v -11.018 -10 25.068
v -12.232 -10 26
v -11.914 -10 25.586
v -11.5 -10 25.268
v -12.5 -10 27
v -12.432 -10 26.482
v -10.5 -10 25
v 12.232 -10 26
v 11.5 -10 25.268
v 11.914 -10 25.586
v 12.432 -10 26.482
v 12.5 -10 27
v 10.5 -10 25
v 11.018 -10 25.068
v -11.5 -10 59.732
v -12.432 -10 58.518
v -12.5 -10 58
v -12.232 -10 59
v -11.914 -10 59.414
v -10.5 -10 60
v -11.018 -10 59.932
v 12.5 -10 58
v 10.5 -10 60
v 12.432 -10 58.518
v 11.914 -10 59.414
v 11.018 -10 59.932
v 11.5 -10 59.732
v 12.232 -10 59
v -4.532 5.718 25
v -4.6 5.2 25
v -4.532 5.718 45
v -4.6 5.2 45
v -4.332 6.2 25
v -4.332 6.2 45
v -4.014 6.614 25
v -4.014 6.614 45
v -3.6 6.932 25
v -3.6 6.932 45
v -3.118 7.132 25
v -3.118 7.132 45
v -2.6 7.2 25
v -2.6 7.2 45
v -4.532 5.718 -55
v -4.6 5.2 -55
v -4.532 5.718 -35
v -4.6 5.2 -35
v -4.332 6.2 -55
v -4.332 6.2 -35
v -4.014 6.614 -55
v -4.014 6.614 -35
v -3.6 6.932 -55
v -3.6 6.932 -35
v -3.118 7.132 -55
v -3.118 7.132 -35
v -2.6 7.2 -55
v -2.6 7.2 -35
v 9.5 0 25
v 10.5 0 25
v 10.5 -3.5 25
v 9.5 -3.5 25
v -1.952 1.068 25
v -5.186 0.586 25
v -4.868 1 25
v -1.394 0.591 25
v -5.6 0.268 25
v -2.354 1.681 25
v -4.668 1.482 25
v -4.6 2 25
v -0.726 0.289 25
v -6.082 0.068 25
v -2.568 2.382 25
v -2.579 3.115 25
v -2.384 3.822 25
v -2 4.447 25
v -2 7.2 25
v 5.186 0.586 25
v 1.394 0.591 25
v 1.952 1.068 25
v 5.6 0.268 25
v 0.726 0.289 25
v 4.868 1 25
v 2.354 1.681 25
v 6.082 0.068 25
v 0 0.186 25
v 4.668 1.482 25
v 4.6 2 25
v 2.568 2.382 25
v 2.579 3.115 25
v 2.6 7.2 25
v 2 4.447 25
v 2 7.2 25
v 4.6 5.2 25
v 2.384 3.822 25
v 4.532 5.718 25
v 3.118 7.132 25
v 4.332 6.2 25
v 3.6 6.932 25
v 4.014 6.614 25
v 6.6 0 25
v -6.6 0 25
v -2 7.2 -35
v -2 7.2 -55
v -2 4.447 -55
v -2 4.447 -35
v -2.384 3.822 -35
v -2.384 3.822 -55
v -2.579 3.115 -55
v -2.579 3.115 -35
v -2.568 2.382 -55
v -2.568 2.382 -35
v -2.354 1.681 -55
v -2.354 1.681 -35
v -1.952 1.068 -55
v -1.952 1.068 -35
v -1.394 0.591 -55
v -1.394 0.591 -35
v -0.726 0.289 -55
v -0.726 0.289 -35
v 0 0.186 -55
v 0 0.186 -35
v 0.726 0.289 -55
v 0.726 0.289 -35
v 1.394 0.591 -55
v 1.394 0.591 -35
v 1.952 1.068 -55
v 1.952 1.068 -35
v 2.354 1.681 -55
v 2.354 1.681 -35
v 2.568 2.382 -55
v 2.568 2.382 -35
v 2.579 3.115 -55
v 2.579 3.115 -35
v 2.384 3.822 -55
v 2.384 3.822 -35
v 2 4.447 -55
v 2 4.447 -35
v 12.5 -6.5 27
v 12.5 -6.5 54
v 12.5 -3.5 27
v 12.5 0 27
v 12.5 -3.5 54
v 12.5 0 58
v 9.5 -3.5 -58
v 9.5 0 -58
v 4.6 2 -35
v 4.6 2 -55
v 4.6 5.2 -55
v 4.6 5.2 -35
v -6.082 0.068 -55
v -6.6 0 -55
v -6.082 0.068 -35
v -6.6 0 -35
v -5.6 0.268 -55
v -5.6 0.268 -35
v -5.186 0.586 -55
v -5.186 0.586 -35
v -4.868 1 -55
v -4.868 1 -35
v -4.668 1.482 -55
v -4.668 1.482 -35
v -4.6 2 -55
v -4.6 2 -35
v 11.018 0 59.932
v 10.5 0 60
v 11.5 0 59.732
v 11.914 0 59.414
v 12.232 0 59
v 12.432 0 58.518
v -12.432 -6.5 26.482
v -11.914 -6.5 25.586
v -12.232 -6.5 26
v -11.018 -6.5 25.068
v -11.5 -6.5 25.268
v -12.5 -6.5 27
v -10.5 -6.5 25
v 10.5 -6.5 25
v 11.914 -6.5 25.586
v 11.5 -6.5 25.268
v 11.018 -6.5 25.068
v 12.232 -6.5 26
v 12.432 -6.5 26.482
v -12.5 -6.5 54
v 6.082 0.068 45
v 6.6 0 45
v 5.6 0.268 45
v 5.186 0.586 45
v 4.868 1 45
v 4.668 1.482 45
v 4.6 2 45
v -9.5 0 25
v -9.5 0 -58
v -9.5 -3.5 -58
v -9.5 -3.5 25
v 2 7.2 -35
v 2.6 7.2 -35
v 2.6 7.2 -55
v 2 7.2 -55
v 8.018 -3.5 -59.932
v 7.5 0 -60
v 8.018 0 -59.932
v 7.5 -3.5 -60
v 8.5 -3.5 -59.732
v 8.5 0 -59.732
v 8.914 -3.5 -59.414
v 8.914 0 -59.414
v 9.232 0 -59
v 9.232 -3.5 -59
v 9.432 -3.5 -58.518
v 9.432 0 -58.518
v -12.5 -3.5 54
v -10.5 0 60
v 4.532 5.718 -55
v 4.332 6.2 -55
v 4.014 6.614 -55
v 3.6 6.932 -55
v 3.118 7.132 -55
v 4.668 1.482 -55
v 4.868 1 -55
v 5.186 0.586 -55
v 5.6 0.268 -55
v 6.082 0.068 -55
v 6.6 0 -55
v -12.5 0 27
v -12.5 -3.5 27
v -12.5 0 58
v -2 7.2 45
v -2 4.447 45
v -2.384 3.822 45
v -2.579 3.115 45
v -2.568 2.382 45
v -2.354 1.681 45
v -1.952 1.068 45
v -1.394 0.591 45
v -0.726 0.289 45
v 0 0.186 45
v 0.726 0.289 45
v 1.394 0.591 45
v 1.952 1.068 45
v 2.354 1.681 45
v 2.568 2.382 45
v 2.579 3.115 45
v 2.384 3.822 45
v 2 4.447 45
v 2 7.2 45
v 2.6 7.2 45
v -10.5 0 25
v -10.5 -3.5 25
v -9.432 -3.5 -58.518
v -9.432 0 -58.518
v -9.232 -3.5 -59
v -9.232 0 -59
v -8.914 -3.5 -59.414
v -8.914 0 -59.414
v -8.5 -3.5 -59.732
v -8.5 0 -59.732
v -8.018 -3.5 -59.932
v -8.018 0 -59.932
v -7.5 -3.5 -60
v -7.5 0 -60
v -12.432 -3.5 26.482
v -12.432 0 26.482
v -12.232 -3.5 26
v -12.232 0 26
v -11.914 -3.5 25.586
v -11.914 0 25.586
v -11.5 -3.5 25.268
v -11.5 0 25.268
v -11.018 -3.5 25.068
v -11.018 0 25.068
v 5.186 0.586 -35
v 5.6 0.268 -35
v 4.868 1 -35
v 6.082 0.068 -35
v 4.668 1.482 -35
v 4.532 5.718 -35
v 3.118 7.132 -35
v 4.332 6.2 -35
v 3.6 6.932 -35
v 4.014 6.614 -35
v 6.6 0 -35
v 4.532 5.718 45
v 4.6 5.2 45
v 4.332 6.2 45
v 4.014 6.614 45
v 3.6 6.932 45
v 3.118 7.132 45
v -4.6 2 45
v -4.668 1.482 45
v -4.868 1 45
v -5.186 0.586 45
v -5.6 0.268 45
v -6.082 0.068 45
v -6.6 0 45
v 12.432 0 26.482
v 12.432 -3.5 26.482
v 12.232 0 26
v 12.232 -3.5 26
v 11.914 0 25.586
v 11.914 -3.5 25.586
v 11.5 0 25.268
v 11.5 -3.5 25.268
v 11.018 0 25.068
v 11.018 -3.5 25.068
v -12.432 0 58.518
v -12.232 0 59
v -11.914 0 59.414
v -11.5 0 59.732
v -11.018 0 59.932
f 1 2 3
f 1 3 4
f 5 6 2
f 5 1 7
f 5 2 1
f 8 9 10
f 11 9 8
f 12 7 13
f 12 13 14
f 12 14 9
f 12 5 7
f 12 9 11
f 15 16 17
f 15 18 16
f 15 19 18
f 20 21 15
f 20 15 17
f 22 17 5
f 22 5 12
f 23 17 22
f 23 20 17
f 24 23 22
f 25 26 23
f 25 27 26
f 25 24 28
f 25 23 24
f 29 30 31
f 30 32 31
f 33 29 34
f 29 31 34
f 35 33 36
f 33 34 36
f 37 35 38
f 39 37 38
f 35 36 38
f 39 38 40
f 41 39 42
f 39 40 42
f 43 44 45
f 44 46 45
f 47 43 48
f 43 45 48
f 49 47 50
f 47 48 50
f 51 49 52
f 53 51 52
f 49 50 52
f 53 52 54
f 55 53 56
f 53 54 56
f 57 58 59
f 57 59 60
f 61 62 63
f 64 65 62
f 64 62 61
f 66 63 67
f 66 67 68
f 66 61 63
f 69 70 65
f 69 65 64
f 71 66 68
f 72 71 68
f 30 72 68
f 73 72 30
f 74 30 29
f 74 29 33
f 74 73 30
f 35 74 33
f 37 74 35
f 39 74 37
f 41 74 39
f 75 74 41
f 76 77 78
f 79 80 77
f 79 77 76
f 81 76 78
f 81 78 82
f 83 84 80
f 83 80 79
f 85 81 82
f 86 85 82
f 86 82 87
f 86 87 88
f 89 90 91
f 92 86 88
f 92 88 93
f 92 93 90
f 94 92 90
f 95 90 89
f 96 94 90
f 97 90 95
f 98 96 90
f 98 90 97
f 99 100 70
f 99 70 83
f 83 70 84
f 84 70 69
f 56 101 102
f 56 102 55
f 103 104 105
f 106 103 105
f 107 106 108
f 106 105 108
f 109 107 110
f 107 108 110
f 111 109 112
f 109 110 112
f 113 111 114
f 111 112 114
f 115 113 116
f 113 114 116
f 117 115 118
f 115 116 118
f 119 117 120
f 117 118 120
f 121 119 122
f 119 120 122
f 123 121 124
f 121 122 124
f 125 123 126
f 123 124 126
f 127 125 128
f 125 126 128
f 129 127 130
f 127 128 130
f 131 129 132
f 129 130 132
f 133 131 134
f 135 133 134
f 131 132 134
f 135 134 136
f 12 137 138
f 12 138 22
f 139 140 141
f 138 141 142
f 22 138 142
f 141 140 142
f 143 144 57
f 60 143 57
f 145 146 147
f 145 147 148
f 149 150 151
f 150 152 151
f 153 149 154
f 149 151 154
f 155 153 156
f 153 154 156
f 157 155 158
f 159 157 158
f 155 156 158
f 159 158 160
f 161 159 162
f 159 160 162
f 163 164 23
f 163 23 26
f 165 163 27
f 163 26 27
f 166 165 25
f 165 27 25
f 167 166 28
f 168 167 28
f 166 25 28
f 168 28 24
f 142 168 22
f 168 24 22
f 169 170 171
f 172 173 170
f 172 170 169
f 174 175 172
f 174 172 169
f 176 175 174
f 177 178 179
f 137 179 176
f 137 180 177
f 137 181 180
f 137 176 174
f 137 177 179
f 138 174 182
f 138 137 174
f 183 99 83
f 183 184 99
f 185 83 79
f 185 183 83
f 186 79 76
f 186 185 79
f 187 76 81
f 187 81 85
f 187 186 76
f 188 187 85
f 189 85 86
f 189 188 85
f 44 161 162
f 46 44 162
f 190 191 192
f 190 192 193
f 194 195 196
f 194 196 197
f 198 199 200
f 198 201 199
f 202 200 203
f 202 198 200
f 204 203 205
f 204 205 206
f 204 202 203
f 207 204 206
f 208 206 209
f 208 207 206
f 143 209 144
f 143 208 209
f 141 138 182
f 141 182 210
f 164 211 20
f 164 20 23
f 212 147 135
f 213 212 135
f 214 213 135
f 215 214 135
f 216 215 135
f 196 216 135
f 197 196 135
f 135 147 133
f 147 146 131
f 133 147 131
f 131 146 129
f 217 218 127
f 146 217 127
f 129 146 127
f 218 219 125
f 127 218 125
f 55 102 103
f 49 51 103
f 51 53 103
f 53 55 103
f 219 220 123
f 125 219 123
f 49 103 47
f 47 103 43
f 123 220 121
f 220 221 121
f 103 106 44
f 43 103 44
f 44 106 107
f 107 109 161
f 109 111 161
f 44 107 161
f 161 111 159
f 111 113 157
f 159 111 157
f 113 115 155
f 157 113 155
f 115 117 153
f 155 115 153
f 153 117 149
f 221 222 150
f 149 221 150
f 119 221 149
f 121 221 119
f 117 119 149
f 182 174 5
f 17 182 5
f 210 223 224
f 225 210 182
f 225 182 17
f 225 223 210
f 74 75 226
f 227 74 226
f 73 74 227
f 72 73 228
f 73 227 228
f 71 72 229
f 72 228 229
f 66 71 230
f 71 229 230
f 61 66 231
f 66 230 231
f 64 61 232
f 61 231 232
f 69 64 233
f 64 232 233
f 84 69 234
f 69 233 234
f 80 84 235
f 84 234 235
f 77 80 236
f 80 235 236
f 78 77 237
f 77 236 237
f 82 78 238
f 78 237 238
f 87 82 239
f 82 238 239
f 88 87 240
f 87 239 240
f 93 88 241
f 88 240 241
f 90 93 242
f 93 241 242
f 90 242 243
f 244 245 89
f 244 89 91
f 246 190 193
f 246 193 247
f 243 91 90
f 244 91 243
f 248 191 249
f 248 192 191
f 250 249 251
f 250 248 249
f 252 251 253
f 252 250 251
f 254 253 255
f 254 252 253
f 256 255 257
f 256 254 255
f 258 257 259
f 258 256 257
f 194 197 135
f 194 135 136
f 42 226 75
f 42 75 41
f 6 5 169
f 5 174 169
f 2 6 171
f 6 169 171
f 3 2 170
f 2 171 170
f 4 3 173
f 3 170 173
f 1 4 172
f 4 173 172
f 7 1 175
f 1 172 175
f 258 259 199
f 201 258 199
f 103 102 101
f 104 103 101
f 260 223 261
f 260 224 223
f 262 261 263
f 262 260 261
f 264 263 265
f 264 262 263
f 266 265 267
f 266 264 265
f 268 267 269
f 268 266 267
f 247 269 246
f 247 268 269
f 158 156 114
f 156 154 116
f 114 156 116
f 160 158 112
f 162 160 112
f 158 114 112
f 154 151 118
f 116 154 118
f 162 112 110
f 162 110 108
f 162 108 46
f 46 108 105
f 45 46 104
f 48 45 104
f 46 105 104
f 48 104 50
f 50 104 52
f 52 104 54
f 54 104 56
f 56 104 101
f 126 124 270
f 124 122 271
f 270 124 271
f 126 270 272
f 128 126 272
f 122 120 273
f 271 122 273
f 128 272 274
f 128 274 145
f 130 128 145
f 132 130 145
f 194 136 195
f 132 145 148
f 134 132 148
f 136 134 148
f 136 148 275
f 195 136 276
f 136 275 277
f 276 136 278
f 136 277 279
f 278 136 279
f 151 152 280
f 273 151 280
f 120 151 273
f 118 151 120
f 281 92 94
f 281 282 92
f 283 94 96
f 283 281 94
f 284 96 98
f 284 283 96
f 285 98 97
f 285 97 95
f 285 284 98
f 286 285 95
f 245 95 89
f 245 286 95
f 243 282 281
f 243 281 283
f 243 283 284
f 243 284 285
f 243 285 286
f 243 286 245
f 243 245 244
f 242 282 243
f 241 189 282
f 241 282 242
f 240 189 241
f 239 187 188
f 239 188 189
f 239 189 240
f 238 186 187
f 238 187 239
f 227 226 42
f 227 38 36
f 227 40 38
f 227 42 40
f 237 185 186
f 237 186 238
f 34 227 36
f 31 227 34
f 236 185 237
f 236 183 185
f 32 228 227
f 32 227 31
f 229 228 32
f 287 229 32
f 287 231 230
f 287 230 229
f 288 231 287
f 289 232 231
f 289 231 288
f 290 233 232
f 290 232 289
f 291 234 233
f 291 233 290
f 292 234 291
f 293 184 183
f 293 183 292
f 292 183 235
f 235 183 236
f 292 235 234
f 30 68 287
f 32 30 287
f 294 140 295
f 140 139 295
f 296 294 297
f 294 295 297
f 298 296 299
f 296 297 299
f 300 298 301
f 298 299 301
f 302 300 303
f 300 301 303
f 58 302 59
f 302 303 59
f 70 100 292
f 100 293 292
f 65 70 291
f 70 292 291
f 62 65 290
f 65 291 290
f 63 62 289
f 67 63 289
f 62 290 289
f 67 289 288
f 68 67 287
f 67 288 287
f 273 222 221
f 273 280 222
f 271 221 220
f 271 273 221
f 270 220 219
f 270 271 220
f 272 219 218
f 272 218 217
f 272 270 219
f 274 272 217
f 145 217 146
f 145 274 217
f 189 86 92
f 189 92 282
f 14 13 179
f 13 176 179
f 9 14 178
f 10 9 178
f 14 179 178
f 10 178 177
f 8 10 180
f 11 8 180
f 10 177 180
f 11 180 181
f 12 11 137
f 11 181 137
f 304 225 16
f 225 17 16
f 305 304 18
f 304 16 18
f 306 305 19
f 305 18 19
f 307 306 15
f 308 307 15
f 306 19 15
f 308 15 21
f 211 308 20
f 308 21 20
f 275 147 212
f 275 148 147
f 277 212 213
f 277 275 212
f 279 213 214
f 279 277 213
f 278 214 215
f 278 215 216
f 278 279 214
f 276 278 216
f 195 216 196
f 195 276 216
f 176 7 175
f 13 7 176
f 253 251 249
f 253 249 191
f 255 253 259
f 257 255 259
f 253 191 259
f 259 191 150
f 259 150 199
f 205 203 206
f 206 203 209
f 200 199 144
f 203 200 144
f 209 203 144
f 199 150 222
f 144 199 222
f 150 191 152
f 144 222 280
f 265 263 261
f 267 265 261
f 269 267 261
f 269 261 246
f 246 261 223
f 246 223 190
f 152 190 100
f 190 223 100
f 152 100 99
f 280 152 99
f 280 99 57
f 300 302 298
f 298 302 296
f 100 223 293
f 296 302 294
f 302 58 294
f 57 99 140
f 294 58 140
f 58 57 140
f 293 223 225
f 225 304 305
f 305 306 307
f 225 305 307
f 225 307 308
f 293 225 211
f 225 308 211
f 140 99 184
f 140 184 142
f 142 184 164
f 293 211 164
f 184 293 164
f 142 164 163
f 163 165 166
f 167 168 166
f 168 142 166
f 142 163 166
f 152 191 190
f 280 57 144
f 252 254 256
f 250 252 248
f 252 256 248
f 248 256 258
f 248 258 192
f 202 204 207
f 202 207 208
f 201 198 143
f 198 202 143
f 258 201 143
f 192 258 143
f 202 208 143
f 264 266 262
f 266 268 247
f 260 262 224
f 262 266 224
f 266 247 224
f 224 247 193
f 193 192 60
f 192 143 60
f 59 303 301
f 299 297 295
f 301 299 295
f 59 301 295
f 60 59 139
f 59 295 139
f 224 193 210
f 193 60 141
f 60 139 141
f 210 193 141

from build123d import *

# Parameters (mm, degrees)
F0_W      = 25
F0_H      = 120
F1_DEPTH  = 10
F3_W      = 3
F3_H      = 114
F4_DEPTH  = 25.001
F5_W      = 9.2
F5_H      = 100
F6_DEPTH  = 7.2
F7_R      = 2.6
F8_DEPTH  = 105.001
F9_W      = 4
F9_H      = 100
F10_DEPTH = 3
F11_W     = 7.2
F11_H     = 60
F12_DEPTH = 17.101
F13_W     = 25
F13_H     = 85
F14_DEPTH = 3.5
F15_W     = 3
F15_H     = 85
F16_DEPTH = 3.5
F17_R     = 2


with BuildPart() as f1:
    # F0 (on Front) → F1 (new body)
    with BuildSketch(Plane.XZ):
        Rectangle(F0_W, F0_H)
    extrude(amount=F1_DEPTH)

    # F3 (on face) → F4 (cut, through all)
    with BuildSketch(Plane.YZ.offset(12.5)):
        with Locations((-5, -3)):
            Rectangle(F3_W, F3_H)
    extrude(amount=-F4_DEPTH, mode=Mode.SUBTRACT)

    # F5 (on face) → F6 (join)
    with BuildSketch(Plane(origin=(0, 0, 0), x_dir=(-1, 0, 0), z_dir=(0, 1, 0))):
        with Locations((0, -5)):
            Rectangle(F5_W, F5_H)
    extrude(amount=F6_DEPTH)

    # F7 (on face) → F8 (cut, through all)
    with BuildSketch(Plane.XY.offset(45)):
        with Locations((0, 2.785714576)):
            Circle(F7_R)
    extrude(amount=-F8_DEPTH, mode=Mode.SUBTRACT)

    # F9 (on face) → F10 (cut)
    with BuildSketch(Plane(origin=(0, 7.2, 0), x_dir=(-1, 0, 0), z_dir=(0, 1, 0))):
        with Locations((0, -5)):
            Rectangle(F9_W, F9_H)
    extrude(amount=-F10_DEPTH, mode=Mode.SUBTRACT)

    # F11 (on face) → F12 (cut, through all)
    with BuildSketch(Plane.YZ.offset(4.6)):
        with Locations((3.6, -5)):
            Rectangle(F11_W, F11_H)
    extrude(amount=-F12_DEPTH, mode=Mode.SUBTRACT)

    # F13 (on face) → F14 (cut, through all)
    with BuildSketch(Plane.XZ.offset(10)):
        with Locations((0, -17.5)):
            Rectangle(F13_W, F13_H)
    extrude(amount=-F14_DEPTH, mode=Mode.SUBTRACT)

    # F15 (on face) → F16 (cut, through all)
    with BuildSketch(Plane(origin=(0, 0, 0), x_dir=(-1, 0, 0), z_dir=(0, 1, 0))):
        with Locations((-11, -17.5)):
            Rectangle(F15_W, F15_H)
        with Locations((11, -17.5)):
            Rectangle(F15_W, F15_H)
    extrude(amount=-F16_DEPTH, mode=Mode.SUBTRACT)

    # F17
    f17_edges = [f1.edges().sort_by_distance(p)[0] for p in [
        (-12.5, -8.25, 25),
        (-12.5, -1.75, 25),
        (12.5, -1.75, 25),
        (12.5, -8.25, 25),
        (-12.5, -5, 60),
        (12.5, -5, 60),
        (-9.5, -1.75, -60),
        (9.5, -1.75, -60),
        (-4.6, 7.2, 35),
        (4.6, 7.2, 35),
        (-4.6, 0, 35),
        (4.6, 0, 35),
        (-4.6, 7.2, -45),
        (4.6, 7.2, -45),
        (-4.6, 0, -45),
        (4.6, 0, -45),
    ]]
    fillet(f17_edges, radius=F17_R)


solid = f1.part
